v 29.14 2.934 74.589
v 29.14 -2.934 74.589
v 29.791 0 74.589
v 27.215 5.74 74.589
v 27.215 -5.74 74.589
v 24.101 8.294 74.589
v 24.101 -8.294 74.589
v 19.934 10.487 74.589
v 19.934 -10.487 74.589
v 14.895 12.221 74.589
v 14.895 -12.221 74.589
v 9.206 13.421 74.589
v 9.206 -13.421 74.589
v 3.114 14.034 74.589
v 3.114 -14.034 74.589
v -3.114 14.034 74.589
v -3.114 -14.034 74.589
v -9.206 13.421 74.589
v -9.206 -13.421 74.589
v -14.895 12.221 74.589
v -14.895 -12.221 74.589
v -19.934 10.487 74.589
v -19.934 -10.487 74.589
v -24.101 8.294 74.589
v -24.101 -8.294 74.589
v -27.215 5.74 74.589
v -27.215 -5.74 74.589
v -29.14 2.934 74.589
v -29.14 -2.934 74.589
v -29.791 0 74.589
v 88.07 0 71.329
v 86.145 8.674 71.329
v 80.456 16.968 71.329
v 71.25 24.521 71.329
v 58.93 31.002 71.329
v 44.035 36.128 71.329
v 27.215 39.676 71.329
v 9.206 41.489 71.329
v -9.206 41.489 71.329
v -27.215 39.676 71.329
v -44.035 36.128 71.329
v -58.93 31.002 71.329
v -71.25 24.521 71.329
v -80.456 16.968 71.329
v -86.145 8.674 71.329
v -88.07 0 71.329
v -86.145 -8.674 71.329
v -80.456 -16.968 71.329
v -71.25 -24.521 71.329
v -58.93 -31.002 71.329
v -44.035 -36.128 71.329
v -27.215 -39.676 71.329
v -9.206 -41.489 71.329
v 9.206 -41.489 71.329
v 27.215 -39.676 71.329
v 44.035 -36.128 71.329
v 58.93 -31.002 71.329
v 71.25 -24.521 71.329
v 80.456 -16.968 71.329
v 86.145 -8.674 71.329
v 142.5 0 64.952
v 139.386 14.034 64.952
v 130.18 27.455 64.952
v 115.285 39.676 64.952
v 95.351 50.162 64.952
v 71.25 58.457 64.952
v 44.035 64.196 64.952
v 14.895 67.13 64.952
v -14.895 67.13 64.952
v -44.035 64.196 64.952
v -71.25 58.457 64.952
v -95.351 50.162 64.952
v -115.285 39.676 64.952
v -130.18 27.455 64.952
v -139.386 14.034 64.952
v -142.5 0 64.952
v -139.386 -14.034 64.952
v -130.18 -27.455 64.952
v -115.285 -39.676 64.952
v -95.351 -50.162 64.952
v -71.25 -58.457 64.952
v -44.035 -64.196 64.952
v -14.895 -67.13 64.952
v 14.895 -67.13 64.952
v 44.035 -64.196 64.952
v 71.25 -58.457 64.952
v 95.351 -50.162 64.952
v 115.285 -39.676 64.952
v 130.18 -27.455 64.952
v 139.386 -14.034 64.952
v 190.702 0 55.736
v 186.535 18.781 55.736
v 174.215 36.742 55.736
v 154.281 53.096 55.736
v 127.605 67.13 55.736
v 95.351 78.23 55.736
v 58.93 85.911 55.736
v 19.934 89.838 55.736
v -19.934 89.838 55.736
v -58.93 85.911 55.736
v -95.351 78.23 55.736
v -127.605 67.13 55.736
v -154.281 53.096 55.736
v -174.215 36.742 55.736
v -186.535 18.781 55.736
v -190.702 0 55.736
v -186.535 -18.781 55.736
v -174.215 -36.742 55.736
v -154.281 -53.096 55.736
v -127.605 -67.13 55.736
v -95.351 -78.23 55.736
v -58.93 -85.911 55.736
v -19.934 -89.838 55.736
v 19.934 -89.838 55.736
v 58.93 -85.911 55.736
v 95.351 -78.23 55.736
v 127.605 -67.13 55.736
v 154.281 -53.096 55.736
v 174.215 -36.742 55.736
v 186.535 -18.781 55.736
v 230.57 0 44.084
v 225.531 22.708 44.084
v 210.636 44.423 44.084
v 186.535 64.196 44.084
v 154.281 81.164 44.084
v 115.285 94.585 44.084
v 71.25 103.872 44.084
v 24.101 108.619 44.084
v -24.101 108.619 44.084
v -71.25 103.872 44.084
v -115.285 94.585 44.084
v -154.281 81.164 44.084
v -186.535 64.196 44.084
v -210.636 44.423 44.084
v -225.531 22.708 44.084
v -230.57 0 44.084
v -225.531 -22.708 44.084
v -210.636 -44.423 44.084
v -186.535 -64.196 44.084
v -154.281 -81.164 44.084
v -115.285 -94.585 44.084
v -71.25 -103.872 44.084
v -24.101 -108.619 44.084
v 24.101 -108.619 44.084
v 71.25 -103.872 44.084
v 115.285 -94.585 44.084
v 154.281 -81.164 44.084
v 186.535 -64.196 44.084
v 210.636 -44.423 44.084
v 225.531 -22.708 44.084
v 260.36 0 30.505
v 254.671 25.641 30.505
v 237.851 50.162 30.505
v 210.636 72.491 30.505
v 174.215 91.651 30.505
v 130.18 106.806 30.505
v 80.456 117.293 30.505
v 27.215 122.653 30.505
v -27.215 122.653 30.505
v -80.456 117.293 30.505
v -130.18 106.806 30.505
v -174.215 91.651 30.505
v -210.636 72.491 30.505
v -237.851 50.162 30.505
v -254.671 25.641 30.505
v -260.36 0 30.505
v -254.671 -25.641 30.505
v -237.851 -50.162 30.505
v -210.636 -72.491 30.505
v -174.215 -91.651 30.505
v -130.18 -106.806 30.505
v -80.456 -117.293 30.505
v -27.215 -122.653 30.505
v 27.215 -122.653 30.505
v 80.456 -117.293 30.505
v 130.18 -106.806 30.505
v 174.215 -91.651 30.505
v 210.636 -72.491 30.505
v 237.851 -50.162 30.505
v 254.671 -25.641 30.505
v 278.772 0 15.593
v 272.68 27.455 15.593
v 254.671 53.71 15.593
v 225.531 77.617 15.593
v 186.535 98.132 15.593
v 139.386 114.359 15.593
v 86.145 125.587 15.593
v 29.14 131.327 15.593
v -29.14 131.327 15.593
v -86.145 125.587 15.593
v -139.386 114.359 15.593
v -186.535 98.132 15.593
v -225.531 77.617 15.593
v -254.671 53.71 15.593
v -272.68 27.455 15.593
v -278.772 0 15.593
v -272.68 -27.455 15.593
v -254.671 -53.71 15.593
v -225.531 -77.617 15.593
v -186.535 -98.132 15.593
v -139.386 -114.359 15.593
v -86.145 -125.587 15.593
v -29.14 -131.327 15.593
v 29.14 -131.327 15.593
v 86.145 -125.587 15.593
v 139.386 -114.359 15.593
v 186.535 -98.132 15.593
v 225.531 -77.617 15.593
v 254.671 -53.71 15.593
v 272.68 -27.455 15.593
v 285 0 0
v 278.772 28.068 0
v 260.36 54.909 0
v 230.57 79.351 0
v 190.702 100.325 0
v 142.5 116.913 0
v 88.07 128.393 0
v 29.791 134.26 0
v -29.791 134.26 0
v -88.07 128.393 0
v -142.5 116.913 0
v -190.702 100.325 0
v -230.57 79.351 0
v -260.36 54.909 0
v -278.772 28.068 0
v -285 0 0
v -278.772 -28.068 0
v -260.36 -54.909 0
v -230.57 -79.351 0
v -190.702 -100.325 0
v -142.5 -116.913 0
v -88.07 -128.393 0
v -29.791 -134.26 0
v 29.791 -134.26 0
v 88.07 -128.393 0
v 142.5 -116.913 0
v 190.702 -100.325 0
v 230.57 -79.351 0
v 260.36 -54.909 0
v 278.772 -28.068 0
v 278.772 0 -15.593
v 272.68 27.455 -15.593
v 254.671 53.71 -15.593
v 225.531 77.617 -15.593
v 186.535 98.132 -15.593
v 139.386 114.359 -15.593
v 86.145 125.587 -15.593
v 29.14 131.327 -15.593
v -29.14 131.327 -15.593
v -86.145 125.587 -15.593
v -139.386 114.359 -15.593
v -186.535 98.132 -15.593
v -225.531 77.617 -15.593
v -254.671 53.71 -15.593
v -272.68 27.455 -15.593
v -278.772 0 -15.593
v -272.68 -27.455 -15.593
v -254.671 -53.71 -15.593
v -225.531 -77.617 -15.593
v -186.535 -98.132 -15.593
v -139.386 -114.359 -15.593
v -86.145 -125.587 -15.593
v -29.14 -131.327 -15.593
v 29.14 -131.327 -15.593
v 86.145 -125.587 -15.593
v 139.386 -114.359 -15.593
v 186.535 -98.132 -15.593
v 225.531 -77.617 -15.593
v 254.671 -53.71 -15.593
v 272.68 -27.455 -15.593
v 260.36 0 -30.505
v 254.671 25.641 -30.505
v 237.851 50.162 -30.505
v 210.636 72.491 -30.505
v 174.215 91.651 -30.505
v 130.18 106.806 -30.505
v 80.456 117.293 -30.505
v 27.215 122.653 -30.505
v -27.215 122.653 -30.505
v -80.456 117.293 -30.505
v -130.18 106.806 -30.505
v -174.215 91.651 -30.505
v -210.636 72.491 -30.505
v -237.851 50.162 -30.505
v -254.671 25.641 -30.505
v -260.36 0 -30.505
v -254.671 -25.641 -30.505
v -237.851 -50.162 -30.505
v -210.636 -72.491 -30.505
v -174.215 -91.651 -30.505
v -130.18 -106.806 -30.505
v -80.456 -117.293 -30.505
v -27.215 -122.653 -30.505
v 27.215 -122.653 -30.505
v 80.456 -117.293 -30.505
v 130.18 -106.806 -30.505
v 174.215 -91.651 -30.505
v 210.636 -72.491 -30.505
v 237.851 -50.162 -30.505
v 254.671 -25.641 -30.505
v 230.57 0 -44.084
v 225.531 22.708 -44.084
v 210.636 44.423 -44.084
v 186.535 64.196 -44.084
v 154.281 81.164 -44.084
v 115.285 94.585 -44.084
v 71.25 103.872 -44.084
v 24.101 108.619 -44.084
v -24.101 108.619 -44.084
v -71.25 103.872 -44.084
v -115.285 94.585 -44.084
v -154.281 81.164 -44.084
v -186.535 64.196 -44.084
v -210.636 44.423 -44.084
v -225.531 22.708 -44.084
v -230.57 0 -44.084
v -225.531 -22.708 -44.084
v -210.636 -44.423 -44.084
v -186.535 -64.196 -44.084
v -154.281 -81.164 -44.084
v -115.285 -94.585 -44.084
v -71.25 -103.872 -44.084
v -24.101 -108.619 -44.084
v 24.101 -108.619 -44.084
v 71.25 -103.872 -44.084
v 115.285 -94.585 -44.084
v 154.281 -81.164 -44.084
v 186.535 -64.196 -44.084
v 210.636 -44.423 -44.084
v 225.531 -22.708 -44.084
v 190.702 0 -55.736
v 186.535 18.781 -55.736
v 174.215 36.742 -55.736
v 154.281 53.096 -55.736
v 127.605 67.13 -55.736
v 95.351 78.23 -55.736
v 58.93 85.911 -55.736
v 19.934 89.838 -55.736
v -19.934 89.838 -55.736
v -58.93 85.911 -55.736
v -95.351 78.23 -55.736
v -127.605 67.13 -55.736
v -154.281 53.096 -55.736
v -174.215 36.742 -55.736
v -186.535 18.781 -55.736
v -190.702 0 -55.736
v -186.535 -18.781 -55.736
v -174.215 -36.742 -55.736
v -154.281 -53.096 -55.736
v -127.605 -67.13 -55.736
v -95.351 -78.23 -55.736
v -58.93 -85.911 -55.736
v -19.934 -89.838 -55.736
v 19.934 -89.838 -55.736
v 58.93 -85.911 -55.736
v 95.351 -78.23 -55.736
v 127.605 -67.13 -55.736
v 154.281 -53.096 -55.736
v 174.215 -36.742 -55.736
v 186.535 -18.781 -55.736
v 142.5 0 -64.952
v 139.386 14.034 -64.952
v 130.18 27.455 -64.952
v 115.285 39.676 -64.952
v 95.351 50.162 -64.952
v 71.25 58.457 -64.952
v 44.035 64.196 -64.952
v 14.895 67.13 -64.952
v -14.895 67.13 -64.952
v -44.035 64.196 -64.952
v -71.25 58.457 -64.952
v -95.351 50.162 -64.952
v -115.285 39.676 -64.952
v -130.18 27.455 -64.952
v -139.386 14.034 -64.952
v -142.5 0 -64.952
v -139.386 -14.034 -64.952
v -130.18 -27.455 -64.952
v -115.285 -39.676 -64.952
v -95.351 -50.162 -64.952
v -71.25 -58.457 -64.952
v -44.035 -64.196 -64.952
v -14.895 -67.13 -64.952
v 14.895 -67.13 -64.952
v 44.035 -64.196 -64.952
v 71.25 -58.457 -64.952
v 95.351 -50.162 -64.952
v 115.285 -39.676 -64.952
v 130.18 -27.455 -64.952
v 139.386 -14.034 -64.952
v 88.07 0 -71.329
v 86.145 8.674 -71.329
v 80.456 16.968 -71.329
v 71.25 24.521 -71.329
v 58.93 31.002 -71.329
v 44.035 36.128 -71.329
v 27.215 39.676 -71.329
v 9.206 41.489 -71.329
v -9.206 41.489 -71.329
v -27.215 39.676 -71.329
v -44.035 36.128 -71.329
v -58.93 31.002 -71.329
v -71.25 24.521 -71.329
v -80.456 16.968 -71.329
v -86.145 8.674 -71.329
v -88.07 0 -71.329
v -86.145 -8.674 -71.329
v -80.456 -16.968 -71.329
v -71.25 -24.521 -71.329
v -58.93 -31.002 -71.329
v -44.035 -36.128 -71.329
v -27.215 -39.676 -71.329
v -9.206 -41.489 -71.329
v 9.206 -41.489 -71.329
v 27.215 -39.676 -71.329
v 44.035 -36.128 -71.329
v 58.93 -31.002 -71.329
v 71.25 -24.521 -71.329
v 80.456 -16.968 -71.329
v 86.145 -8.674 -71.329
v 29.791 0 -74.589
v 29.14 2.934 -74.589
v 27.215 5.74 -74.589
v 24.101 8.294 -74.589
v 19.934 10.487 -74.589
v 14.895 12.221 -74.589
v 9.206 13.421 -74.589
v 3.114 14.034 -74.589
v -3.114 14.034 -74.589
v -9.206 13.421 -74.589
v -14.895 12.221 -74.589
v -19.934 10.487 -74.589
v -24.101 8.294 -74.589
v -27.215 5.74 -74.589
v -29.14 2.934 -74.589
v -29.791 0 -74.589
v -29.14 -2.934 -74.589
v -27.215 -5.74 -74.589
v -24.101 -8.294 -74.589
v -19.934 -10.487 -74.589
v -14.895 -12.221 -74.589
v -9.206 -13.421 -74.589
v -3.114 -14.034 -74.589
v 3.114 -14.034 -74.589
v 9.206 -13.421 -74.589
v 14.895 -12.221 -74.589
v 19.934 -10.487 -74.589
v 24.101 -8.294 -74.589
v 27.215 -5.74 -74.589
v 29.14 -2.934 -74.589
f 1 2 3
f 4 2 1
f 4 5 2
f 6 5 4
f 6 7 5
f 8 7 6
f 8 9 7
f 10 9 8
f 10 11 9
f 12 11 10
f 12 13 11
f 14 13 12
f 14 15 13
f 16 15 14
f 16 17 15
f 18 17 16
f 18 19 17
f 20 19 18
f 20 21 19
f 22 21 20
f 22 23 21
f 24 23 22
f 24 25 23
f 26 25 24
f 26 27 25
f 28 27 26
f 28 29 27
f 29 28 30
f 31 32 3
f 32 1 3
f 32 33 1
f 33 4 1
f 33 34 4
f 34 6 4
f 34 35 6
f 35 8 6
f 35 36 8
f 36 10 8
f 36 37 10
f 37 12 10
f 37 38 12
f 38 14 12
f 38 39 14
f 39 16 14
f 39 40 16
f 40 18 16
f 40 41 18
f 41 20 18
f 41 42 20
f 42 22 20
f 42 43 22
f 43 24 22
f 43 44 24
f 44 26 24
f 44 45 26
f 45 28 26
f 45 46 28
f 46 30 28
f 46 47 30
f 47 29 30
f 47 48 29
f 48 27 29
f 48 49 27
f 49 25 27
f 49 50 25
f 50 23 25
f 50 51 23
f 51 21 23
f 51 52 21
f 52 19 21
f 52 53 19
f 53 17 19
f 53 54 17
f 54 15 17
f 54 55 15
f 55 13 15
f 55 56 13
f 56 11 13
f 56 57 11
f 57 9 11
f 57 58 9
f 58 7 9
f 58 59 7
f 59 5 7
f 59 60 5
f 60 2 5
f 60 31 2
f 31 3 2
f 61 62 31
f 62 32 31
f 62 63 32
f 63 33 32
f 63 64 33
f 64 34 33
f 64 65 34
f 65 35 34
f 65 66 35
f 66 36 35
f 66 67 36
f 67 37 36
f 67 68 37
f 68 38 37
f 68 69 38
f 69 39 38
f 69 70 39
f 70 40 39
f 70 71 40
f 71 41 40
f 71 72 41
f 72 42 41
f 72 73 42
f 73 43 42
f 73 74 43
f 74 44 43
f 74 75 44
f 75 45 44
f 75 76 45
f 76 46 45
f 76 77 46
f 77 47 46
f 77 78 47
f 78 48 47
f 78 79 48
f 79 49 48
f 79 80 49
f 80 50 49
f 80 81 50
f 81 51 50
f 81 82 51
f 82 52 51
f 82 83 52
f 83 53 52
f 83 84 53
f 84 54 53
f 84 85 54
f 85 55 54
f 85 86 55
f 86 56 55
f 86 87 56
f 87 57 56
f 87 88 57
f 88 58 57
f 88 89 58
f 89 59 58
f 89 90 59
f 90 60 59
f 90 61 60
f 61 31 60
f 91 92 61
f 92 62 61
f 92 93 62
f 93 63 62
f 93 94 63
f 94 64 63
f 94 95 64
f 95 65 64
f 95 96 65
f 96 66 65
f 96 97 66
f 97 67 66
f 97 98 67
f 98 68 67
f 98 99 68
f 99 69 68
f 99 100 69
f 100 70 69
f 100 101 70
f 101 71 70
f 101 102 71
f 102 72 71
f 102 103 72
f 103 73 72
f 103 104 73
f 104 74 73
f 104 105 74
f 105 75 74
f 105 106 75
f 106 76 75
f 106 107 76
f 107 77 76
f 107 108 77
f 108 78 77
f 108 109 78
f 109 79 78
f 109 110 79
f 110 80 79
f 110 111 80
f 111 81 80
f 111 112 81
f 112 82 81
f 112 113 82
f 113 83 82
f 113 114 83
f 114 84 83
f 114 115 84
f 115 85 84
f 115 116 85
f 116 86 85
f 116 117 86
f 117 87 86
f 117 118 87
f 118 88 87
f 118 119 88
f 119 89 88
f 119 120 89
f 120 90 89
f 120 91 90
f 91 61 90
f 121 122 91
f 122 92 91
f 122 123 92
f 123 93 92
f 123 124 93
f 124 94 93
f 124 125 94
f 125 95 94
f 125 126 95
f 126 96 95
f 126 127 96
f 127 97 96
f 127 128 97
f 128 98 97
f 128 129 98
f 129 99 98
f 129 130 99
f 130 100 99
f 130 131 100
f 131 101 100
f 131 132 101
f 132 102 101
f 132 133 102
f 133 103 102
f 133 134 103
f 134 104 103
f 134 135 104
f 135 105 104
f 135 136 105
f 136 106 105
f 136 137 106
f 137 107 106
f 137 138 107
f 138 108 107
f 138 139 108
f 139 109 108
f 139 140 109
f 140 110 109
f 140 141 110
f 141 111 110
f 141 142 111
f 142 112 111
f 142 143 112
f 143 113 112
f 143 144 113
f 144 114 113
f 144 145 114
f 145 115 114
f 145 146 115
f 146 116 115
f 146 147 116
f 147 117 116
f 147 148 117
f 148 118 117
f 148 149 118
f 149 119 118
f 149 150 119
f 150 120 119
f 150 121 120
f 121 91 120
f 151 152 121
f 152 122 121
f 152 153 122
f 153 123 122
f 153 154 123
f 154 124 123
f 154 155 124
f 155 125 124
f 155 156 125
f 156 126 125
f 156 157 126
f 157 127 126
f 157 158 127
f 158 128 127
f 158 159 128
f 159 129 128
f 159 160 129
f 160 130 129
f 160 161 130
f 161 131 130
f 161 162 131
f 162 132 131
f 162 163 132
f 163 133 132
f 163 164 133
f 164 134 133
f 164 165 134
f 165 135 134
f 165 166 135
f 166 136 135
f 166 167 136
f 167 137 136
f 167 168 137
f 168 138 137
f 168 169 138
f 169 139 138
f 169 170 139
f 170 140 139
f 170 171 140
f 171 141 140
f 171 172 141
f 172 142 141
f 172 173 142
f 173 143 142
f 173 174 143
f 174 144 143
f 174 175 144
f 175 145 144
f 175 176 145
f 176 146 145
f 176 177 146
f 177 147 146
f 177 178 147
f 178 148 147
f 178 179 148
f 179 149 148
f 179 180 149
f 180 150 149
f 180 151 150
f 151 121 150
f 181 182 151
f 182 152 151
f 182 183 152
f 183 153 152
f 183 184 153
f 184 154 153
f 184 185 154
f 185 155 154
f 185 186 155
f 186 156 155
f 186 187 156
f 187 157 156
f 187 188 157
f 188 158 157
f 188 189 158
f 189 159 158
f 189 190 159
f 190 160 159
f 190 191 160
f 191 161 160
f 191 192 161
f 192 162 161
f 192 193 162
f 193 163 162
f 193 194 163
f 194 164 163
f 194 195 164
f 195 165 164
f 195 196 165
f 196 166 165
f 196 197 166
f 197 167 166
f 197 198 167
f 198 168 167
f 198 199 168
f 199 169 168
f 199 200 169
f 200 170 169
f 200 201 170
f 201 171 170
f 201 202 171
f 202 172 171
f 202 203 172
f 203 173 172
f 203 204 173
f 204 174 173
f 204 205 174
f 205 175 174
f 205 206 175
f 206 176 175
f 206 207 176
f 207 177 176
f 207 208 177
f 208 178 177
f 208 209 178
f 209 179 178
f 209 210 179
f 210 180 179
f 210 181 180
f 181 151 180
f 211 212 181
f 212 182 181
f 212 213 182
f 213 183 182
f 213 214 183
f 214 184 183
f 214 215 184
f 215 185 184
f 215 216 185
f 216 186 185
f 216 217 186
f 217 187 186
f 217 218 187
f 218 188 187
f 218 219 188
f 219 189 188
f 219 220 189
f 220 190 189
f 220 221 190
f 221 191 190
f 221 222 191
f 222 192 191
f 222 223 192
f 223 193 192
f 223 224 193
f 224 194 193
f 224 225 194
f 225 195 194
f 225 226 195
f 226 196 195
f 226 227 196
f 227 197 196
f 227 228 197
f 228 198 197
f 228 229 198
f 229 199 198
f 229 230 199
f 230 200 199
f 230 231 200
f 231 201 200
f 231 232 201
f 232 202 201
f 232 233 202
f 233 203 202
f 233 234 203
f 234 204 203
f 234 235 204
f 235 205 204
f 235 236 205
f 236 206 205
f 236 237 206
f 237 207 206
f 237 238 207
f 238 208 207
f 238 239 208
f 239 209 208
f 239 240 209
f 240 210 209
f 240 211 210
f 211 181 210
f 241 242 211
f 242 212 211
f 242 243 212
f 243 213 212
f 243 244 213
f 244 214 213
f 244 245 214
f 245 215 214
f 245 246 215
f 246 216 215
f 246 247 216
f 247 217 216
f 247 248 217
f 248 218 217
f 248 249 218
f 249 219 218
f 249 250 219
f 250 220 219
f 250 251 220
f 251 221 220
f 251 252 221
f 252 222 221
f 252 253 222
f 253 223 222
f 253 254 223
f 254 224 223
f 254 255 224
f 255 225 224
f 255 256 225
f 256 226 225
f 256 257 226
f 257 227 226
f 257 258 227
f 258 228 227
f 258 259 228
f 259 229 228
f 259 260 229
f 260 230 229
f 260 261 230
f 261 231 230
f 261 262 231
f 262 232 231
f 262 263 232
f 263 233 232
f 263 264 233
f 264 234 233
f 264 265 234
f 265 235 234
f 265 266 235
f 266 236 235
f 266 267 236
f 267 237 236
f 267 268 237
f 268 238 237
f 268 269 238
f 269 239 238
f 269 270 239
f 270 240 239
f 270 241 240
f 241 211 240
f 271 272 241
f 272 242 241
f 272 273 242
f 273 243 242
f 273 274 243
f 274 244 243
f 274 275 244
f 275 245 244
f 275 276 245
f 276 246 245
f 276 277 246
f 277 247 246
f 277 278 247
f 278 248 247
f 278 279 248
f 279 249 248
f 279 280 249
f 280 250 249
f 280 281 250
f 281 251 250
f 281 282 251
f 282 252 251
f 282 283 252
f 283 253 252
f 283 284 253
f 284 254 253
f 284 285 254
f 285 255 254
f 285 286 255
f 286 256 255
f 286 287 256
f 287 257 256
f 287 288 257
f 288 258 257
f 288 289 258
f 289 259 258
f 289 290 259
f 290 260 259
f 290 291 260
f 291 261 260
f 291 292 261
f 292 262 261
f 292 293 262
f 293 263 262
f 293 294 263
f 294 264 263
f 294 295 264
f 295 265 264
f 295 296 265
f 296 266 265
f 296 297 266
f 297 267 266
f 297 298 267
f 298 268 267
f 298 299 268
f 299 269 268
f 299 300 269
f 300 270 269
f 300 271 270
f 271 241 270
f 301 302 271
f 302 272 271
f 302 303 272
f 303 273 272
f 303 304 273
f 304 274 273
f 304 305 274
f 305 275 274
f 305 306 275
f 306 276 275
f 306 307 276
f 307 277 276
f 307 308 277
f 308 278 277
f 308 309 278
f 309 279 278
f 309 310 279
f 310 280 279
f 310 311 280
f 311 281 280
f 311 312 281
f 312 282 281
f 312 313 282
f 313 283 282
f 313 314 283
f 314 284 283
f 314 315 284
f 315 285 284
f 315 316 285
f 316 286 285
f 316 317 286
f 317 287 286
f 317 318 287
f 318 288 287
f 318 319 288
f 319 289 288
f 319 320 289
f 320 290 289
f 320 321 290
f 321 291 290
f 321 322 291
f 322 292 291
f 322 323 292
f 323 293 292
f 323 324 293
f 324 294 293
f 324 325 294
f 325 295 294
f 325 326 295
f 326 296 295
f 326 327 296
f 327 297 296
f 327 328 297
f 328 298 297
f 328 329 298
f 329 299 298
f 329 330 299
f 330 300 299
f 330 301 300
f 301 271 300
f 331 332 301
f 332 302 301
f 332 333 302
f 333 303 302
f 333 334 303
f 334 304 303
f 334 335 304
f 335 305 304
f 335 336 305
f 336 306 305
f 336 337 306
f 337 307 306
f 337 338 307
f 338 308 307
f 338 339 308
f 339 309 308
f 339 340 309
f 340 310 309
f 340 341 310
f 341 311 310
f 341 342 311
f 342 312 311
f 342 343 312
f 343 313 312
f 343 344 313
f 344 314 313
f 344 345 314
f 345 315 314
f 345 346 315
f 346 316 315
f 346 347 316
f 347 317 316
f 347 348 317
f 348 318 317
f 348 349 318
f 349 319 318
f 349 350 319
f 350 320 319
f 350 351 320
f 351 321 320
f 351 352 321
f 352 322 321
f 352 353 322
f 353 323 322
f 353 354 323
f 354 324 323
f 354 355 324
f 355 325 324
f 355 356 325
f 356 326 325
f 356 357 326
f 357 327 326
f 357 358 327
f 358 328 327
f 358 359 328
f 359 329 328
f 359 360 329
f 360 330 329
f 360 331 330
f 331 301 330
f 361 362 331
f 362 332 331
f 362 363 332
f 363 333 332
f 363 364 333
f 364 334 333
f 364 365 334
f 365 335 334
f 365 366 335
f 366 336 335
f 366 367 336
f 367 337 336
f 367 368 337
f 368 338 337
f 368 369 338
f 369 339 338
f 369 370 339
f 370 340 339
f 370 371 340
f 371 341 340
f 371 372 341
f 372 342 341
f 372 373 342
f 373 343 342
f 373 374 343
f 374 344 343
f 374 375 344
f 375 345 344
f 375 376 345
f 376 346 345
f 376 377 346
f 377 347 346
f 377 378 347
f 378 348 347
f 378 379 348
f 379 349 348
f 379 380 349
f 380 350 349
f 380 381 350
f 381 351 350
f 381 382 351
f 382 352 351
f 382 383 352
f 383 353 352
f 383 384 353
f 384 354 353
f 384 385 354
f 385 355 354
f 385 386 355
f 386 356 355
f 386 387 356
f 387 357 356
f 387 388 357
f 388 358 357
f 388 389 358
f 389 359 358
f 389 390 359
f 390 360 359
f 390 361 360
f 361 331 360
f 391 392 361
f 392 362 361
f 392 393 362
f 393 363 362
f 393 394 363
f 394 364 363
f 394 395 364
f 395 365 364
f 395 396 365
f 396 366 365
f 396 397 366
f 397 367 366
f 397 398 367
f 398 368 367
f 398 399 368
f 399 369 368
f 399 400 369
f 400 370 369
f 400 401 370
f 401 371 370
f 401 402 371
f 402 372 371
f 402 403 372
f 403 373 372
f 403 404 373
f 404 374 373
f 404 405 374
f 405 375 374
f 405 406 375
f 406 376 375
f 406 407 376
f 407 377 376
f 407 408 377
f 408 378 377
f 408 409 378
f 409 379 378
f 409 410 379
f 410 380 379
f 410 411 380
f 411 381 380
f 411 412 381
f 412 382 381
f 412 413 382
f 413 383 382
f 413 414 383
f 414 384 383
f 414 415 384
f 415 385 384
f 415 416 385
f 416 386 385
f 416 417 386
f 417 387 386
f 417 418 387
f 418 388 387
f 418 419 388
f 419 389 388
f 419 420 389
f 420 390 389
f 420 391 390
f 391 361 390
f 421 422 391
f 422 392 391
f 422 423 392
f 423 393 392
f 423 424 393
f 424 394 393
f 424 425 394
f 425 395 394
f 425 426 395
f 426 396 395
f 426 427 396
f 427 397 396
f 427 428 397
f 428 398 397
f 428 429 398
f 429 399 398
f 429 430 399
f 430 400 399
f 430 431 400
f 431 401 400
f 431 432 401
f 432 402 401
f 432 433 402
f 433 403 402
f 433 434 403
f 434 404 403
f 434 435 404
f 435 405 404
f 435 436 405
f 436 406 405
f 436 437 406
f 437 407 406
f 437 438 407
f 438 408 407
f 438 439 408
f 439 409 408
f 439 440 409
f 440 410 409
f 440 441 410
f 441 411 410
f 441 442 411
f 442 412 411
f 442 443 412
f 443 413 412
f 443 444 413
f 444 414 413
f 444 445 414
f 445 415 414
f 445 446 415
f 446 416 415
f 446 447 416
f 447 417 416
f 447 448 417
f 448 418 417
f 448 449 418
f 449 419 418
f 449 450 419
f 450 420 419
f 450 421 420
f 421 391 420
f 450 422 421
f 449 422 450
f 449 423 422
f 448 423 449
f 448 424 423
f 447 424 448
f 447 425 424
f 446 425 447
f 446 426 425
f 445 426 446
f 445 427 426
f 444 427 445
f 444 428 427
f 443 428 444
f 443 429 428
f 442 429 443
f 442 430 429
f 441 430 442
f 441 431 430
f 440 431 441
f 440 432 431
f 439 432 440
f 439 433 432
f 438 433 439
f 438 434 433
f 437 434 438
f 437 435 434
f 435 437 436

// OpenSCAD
// Generated by SolidPython 1.0.1 on 2020-07-29 00:46:53


scale(v = [19, 9, 5]) {
	sphere(r = 15);
}
/***********************************************
*********      SolidPython code:      **********
************************************************
 
# import packages: SolidPython
from solid import *
from solid.utils import *
from itertools import chain, combinations, permutations


class Resize:

    def __init__(self, scad_file):
        self.scad_file = scad_file
        #self.scad_file = import_scad(scad_file)
        # cone/cylinder param:
        self.r1 = 0
        self.r2 = 0
        self.h = 0
        # rectangular prism param:
        self.w = 0
        self.l = 0
        # ellipse param:
        self.r = 0

    # import OpenScad code (file name corresponds to shape)


    # classify shape + parameters
    def assign(self, param1, param2, param3):
        if self.scad_file == 'cone.scad':
            self.r1 = param1
            self.r2 = param2
            self.h = param3
        elif self.scad_file == 'cylinder.scad':
            self.r1 = param1
            self.r2 = param2
            self.h = param3
        elif self.scad_file == 'rectangularPrism.scad':
            self.h = param1
            self.l = param2
            self.w = param3
        else:
            self.r = param1
            self.h = param2

    # resize parameters
    def iterate(self):
        x = range(3, 20, 2)
        i = 1
        if self.scad_file == 'cone.scad':
            tempList = list(permutations(x, 2))
            for temp in tempList:
                param1 = temp[0]
                param2 = temp[1]
                filepath = 'produced_scad_files/' + 'cone' + str(param1) + '_' + str(param2) + '_' + '.scad'
                scad_render_to_file(cylinder(h=param1, r1=param2, r2=0), filepath)

        elif self.scad_file == 'cylinder.scad':
            tempList = list(permutations(x, 3))
            for temp in tempList:
                param1 = temp[0]
                param2 = temp[1]
                filepath = 'produced_scad_files/' + 'cylinder' + str(param1) + '_' + str(param2) + '_' + '.scad'
                scad_render_to_file(cylinder(h=param1, r1=param2, r2=param2), filepath)

        elif self.scad_file == 'rectangularPrism.scad':
            tempList = list(permutations(x, 3))
            for temp in tempList:
                param1 = temp[0]
                param2 = temp[1]
                param3 = temp[2]
                filepath = 'produced_scad_files/' + 'rectangularPrism' + str(param1) + '_' + str(param2) + '_' + str(
                    param3) + '.scad'
                scad_render_to_file(cube(size=(param1, param2, param3)), filepath)

        elif self.scad_file == 'ellipse.scad':
            tempList = list(permutations(x, 4))
            for temp in tempList:
                param1 = temp[0]
                param2 = temp[1]
                param3 = temp[2]
                param4 = temp[3]
                filepath = 'produced_scad_files/' + 'ellipse' + str(param1) + '_' + str(param2) + '_' + str(param3) + '_' + str(param4) + '.scad'
                scad_render_to_file(scale([param1, param2, param3])(sphere(r=param4)), filepath)

    def render_to_scadfile(self):
        scad_render_to_file(scad, 'example.scad') 
 
************************************************/
